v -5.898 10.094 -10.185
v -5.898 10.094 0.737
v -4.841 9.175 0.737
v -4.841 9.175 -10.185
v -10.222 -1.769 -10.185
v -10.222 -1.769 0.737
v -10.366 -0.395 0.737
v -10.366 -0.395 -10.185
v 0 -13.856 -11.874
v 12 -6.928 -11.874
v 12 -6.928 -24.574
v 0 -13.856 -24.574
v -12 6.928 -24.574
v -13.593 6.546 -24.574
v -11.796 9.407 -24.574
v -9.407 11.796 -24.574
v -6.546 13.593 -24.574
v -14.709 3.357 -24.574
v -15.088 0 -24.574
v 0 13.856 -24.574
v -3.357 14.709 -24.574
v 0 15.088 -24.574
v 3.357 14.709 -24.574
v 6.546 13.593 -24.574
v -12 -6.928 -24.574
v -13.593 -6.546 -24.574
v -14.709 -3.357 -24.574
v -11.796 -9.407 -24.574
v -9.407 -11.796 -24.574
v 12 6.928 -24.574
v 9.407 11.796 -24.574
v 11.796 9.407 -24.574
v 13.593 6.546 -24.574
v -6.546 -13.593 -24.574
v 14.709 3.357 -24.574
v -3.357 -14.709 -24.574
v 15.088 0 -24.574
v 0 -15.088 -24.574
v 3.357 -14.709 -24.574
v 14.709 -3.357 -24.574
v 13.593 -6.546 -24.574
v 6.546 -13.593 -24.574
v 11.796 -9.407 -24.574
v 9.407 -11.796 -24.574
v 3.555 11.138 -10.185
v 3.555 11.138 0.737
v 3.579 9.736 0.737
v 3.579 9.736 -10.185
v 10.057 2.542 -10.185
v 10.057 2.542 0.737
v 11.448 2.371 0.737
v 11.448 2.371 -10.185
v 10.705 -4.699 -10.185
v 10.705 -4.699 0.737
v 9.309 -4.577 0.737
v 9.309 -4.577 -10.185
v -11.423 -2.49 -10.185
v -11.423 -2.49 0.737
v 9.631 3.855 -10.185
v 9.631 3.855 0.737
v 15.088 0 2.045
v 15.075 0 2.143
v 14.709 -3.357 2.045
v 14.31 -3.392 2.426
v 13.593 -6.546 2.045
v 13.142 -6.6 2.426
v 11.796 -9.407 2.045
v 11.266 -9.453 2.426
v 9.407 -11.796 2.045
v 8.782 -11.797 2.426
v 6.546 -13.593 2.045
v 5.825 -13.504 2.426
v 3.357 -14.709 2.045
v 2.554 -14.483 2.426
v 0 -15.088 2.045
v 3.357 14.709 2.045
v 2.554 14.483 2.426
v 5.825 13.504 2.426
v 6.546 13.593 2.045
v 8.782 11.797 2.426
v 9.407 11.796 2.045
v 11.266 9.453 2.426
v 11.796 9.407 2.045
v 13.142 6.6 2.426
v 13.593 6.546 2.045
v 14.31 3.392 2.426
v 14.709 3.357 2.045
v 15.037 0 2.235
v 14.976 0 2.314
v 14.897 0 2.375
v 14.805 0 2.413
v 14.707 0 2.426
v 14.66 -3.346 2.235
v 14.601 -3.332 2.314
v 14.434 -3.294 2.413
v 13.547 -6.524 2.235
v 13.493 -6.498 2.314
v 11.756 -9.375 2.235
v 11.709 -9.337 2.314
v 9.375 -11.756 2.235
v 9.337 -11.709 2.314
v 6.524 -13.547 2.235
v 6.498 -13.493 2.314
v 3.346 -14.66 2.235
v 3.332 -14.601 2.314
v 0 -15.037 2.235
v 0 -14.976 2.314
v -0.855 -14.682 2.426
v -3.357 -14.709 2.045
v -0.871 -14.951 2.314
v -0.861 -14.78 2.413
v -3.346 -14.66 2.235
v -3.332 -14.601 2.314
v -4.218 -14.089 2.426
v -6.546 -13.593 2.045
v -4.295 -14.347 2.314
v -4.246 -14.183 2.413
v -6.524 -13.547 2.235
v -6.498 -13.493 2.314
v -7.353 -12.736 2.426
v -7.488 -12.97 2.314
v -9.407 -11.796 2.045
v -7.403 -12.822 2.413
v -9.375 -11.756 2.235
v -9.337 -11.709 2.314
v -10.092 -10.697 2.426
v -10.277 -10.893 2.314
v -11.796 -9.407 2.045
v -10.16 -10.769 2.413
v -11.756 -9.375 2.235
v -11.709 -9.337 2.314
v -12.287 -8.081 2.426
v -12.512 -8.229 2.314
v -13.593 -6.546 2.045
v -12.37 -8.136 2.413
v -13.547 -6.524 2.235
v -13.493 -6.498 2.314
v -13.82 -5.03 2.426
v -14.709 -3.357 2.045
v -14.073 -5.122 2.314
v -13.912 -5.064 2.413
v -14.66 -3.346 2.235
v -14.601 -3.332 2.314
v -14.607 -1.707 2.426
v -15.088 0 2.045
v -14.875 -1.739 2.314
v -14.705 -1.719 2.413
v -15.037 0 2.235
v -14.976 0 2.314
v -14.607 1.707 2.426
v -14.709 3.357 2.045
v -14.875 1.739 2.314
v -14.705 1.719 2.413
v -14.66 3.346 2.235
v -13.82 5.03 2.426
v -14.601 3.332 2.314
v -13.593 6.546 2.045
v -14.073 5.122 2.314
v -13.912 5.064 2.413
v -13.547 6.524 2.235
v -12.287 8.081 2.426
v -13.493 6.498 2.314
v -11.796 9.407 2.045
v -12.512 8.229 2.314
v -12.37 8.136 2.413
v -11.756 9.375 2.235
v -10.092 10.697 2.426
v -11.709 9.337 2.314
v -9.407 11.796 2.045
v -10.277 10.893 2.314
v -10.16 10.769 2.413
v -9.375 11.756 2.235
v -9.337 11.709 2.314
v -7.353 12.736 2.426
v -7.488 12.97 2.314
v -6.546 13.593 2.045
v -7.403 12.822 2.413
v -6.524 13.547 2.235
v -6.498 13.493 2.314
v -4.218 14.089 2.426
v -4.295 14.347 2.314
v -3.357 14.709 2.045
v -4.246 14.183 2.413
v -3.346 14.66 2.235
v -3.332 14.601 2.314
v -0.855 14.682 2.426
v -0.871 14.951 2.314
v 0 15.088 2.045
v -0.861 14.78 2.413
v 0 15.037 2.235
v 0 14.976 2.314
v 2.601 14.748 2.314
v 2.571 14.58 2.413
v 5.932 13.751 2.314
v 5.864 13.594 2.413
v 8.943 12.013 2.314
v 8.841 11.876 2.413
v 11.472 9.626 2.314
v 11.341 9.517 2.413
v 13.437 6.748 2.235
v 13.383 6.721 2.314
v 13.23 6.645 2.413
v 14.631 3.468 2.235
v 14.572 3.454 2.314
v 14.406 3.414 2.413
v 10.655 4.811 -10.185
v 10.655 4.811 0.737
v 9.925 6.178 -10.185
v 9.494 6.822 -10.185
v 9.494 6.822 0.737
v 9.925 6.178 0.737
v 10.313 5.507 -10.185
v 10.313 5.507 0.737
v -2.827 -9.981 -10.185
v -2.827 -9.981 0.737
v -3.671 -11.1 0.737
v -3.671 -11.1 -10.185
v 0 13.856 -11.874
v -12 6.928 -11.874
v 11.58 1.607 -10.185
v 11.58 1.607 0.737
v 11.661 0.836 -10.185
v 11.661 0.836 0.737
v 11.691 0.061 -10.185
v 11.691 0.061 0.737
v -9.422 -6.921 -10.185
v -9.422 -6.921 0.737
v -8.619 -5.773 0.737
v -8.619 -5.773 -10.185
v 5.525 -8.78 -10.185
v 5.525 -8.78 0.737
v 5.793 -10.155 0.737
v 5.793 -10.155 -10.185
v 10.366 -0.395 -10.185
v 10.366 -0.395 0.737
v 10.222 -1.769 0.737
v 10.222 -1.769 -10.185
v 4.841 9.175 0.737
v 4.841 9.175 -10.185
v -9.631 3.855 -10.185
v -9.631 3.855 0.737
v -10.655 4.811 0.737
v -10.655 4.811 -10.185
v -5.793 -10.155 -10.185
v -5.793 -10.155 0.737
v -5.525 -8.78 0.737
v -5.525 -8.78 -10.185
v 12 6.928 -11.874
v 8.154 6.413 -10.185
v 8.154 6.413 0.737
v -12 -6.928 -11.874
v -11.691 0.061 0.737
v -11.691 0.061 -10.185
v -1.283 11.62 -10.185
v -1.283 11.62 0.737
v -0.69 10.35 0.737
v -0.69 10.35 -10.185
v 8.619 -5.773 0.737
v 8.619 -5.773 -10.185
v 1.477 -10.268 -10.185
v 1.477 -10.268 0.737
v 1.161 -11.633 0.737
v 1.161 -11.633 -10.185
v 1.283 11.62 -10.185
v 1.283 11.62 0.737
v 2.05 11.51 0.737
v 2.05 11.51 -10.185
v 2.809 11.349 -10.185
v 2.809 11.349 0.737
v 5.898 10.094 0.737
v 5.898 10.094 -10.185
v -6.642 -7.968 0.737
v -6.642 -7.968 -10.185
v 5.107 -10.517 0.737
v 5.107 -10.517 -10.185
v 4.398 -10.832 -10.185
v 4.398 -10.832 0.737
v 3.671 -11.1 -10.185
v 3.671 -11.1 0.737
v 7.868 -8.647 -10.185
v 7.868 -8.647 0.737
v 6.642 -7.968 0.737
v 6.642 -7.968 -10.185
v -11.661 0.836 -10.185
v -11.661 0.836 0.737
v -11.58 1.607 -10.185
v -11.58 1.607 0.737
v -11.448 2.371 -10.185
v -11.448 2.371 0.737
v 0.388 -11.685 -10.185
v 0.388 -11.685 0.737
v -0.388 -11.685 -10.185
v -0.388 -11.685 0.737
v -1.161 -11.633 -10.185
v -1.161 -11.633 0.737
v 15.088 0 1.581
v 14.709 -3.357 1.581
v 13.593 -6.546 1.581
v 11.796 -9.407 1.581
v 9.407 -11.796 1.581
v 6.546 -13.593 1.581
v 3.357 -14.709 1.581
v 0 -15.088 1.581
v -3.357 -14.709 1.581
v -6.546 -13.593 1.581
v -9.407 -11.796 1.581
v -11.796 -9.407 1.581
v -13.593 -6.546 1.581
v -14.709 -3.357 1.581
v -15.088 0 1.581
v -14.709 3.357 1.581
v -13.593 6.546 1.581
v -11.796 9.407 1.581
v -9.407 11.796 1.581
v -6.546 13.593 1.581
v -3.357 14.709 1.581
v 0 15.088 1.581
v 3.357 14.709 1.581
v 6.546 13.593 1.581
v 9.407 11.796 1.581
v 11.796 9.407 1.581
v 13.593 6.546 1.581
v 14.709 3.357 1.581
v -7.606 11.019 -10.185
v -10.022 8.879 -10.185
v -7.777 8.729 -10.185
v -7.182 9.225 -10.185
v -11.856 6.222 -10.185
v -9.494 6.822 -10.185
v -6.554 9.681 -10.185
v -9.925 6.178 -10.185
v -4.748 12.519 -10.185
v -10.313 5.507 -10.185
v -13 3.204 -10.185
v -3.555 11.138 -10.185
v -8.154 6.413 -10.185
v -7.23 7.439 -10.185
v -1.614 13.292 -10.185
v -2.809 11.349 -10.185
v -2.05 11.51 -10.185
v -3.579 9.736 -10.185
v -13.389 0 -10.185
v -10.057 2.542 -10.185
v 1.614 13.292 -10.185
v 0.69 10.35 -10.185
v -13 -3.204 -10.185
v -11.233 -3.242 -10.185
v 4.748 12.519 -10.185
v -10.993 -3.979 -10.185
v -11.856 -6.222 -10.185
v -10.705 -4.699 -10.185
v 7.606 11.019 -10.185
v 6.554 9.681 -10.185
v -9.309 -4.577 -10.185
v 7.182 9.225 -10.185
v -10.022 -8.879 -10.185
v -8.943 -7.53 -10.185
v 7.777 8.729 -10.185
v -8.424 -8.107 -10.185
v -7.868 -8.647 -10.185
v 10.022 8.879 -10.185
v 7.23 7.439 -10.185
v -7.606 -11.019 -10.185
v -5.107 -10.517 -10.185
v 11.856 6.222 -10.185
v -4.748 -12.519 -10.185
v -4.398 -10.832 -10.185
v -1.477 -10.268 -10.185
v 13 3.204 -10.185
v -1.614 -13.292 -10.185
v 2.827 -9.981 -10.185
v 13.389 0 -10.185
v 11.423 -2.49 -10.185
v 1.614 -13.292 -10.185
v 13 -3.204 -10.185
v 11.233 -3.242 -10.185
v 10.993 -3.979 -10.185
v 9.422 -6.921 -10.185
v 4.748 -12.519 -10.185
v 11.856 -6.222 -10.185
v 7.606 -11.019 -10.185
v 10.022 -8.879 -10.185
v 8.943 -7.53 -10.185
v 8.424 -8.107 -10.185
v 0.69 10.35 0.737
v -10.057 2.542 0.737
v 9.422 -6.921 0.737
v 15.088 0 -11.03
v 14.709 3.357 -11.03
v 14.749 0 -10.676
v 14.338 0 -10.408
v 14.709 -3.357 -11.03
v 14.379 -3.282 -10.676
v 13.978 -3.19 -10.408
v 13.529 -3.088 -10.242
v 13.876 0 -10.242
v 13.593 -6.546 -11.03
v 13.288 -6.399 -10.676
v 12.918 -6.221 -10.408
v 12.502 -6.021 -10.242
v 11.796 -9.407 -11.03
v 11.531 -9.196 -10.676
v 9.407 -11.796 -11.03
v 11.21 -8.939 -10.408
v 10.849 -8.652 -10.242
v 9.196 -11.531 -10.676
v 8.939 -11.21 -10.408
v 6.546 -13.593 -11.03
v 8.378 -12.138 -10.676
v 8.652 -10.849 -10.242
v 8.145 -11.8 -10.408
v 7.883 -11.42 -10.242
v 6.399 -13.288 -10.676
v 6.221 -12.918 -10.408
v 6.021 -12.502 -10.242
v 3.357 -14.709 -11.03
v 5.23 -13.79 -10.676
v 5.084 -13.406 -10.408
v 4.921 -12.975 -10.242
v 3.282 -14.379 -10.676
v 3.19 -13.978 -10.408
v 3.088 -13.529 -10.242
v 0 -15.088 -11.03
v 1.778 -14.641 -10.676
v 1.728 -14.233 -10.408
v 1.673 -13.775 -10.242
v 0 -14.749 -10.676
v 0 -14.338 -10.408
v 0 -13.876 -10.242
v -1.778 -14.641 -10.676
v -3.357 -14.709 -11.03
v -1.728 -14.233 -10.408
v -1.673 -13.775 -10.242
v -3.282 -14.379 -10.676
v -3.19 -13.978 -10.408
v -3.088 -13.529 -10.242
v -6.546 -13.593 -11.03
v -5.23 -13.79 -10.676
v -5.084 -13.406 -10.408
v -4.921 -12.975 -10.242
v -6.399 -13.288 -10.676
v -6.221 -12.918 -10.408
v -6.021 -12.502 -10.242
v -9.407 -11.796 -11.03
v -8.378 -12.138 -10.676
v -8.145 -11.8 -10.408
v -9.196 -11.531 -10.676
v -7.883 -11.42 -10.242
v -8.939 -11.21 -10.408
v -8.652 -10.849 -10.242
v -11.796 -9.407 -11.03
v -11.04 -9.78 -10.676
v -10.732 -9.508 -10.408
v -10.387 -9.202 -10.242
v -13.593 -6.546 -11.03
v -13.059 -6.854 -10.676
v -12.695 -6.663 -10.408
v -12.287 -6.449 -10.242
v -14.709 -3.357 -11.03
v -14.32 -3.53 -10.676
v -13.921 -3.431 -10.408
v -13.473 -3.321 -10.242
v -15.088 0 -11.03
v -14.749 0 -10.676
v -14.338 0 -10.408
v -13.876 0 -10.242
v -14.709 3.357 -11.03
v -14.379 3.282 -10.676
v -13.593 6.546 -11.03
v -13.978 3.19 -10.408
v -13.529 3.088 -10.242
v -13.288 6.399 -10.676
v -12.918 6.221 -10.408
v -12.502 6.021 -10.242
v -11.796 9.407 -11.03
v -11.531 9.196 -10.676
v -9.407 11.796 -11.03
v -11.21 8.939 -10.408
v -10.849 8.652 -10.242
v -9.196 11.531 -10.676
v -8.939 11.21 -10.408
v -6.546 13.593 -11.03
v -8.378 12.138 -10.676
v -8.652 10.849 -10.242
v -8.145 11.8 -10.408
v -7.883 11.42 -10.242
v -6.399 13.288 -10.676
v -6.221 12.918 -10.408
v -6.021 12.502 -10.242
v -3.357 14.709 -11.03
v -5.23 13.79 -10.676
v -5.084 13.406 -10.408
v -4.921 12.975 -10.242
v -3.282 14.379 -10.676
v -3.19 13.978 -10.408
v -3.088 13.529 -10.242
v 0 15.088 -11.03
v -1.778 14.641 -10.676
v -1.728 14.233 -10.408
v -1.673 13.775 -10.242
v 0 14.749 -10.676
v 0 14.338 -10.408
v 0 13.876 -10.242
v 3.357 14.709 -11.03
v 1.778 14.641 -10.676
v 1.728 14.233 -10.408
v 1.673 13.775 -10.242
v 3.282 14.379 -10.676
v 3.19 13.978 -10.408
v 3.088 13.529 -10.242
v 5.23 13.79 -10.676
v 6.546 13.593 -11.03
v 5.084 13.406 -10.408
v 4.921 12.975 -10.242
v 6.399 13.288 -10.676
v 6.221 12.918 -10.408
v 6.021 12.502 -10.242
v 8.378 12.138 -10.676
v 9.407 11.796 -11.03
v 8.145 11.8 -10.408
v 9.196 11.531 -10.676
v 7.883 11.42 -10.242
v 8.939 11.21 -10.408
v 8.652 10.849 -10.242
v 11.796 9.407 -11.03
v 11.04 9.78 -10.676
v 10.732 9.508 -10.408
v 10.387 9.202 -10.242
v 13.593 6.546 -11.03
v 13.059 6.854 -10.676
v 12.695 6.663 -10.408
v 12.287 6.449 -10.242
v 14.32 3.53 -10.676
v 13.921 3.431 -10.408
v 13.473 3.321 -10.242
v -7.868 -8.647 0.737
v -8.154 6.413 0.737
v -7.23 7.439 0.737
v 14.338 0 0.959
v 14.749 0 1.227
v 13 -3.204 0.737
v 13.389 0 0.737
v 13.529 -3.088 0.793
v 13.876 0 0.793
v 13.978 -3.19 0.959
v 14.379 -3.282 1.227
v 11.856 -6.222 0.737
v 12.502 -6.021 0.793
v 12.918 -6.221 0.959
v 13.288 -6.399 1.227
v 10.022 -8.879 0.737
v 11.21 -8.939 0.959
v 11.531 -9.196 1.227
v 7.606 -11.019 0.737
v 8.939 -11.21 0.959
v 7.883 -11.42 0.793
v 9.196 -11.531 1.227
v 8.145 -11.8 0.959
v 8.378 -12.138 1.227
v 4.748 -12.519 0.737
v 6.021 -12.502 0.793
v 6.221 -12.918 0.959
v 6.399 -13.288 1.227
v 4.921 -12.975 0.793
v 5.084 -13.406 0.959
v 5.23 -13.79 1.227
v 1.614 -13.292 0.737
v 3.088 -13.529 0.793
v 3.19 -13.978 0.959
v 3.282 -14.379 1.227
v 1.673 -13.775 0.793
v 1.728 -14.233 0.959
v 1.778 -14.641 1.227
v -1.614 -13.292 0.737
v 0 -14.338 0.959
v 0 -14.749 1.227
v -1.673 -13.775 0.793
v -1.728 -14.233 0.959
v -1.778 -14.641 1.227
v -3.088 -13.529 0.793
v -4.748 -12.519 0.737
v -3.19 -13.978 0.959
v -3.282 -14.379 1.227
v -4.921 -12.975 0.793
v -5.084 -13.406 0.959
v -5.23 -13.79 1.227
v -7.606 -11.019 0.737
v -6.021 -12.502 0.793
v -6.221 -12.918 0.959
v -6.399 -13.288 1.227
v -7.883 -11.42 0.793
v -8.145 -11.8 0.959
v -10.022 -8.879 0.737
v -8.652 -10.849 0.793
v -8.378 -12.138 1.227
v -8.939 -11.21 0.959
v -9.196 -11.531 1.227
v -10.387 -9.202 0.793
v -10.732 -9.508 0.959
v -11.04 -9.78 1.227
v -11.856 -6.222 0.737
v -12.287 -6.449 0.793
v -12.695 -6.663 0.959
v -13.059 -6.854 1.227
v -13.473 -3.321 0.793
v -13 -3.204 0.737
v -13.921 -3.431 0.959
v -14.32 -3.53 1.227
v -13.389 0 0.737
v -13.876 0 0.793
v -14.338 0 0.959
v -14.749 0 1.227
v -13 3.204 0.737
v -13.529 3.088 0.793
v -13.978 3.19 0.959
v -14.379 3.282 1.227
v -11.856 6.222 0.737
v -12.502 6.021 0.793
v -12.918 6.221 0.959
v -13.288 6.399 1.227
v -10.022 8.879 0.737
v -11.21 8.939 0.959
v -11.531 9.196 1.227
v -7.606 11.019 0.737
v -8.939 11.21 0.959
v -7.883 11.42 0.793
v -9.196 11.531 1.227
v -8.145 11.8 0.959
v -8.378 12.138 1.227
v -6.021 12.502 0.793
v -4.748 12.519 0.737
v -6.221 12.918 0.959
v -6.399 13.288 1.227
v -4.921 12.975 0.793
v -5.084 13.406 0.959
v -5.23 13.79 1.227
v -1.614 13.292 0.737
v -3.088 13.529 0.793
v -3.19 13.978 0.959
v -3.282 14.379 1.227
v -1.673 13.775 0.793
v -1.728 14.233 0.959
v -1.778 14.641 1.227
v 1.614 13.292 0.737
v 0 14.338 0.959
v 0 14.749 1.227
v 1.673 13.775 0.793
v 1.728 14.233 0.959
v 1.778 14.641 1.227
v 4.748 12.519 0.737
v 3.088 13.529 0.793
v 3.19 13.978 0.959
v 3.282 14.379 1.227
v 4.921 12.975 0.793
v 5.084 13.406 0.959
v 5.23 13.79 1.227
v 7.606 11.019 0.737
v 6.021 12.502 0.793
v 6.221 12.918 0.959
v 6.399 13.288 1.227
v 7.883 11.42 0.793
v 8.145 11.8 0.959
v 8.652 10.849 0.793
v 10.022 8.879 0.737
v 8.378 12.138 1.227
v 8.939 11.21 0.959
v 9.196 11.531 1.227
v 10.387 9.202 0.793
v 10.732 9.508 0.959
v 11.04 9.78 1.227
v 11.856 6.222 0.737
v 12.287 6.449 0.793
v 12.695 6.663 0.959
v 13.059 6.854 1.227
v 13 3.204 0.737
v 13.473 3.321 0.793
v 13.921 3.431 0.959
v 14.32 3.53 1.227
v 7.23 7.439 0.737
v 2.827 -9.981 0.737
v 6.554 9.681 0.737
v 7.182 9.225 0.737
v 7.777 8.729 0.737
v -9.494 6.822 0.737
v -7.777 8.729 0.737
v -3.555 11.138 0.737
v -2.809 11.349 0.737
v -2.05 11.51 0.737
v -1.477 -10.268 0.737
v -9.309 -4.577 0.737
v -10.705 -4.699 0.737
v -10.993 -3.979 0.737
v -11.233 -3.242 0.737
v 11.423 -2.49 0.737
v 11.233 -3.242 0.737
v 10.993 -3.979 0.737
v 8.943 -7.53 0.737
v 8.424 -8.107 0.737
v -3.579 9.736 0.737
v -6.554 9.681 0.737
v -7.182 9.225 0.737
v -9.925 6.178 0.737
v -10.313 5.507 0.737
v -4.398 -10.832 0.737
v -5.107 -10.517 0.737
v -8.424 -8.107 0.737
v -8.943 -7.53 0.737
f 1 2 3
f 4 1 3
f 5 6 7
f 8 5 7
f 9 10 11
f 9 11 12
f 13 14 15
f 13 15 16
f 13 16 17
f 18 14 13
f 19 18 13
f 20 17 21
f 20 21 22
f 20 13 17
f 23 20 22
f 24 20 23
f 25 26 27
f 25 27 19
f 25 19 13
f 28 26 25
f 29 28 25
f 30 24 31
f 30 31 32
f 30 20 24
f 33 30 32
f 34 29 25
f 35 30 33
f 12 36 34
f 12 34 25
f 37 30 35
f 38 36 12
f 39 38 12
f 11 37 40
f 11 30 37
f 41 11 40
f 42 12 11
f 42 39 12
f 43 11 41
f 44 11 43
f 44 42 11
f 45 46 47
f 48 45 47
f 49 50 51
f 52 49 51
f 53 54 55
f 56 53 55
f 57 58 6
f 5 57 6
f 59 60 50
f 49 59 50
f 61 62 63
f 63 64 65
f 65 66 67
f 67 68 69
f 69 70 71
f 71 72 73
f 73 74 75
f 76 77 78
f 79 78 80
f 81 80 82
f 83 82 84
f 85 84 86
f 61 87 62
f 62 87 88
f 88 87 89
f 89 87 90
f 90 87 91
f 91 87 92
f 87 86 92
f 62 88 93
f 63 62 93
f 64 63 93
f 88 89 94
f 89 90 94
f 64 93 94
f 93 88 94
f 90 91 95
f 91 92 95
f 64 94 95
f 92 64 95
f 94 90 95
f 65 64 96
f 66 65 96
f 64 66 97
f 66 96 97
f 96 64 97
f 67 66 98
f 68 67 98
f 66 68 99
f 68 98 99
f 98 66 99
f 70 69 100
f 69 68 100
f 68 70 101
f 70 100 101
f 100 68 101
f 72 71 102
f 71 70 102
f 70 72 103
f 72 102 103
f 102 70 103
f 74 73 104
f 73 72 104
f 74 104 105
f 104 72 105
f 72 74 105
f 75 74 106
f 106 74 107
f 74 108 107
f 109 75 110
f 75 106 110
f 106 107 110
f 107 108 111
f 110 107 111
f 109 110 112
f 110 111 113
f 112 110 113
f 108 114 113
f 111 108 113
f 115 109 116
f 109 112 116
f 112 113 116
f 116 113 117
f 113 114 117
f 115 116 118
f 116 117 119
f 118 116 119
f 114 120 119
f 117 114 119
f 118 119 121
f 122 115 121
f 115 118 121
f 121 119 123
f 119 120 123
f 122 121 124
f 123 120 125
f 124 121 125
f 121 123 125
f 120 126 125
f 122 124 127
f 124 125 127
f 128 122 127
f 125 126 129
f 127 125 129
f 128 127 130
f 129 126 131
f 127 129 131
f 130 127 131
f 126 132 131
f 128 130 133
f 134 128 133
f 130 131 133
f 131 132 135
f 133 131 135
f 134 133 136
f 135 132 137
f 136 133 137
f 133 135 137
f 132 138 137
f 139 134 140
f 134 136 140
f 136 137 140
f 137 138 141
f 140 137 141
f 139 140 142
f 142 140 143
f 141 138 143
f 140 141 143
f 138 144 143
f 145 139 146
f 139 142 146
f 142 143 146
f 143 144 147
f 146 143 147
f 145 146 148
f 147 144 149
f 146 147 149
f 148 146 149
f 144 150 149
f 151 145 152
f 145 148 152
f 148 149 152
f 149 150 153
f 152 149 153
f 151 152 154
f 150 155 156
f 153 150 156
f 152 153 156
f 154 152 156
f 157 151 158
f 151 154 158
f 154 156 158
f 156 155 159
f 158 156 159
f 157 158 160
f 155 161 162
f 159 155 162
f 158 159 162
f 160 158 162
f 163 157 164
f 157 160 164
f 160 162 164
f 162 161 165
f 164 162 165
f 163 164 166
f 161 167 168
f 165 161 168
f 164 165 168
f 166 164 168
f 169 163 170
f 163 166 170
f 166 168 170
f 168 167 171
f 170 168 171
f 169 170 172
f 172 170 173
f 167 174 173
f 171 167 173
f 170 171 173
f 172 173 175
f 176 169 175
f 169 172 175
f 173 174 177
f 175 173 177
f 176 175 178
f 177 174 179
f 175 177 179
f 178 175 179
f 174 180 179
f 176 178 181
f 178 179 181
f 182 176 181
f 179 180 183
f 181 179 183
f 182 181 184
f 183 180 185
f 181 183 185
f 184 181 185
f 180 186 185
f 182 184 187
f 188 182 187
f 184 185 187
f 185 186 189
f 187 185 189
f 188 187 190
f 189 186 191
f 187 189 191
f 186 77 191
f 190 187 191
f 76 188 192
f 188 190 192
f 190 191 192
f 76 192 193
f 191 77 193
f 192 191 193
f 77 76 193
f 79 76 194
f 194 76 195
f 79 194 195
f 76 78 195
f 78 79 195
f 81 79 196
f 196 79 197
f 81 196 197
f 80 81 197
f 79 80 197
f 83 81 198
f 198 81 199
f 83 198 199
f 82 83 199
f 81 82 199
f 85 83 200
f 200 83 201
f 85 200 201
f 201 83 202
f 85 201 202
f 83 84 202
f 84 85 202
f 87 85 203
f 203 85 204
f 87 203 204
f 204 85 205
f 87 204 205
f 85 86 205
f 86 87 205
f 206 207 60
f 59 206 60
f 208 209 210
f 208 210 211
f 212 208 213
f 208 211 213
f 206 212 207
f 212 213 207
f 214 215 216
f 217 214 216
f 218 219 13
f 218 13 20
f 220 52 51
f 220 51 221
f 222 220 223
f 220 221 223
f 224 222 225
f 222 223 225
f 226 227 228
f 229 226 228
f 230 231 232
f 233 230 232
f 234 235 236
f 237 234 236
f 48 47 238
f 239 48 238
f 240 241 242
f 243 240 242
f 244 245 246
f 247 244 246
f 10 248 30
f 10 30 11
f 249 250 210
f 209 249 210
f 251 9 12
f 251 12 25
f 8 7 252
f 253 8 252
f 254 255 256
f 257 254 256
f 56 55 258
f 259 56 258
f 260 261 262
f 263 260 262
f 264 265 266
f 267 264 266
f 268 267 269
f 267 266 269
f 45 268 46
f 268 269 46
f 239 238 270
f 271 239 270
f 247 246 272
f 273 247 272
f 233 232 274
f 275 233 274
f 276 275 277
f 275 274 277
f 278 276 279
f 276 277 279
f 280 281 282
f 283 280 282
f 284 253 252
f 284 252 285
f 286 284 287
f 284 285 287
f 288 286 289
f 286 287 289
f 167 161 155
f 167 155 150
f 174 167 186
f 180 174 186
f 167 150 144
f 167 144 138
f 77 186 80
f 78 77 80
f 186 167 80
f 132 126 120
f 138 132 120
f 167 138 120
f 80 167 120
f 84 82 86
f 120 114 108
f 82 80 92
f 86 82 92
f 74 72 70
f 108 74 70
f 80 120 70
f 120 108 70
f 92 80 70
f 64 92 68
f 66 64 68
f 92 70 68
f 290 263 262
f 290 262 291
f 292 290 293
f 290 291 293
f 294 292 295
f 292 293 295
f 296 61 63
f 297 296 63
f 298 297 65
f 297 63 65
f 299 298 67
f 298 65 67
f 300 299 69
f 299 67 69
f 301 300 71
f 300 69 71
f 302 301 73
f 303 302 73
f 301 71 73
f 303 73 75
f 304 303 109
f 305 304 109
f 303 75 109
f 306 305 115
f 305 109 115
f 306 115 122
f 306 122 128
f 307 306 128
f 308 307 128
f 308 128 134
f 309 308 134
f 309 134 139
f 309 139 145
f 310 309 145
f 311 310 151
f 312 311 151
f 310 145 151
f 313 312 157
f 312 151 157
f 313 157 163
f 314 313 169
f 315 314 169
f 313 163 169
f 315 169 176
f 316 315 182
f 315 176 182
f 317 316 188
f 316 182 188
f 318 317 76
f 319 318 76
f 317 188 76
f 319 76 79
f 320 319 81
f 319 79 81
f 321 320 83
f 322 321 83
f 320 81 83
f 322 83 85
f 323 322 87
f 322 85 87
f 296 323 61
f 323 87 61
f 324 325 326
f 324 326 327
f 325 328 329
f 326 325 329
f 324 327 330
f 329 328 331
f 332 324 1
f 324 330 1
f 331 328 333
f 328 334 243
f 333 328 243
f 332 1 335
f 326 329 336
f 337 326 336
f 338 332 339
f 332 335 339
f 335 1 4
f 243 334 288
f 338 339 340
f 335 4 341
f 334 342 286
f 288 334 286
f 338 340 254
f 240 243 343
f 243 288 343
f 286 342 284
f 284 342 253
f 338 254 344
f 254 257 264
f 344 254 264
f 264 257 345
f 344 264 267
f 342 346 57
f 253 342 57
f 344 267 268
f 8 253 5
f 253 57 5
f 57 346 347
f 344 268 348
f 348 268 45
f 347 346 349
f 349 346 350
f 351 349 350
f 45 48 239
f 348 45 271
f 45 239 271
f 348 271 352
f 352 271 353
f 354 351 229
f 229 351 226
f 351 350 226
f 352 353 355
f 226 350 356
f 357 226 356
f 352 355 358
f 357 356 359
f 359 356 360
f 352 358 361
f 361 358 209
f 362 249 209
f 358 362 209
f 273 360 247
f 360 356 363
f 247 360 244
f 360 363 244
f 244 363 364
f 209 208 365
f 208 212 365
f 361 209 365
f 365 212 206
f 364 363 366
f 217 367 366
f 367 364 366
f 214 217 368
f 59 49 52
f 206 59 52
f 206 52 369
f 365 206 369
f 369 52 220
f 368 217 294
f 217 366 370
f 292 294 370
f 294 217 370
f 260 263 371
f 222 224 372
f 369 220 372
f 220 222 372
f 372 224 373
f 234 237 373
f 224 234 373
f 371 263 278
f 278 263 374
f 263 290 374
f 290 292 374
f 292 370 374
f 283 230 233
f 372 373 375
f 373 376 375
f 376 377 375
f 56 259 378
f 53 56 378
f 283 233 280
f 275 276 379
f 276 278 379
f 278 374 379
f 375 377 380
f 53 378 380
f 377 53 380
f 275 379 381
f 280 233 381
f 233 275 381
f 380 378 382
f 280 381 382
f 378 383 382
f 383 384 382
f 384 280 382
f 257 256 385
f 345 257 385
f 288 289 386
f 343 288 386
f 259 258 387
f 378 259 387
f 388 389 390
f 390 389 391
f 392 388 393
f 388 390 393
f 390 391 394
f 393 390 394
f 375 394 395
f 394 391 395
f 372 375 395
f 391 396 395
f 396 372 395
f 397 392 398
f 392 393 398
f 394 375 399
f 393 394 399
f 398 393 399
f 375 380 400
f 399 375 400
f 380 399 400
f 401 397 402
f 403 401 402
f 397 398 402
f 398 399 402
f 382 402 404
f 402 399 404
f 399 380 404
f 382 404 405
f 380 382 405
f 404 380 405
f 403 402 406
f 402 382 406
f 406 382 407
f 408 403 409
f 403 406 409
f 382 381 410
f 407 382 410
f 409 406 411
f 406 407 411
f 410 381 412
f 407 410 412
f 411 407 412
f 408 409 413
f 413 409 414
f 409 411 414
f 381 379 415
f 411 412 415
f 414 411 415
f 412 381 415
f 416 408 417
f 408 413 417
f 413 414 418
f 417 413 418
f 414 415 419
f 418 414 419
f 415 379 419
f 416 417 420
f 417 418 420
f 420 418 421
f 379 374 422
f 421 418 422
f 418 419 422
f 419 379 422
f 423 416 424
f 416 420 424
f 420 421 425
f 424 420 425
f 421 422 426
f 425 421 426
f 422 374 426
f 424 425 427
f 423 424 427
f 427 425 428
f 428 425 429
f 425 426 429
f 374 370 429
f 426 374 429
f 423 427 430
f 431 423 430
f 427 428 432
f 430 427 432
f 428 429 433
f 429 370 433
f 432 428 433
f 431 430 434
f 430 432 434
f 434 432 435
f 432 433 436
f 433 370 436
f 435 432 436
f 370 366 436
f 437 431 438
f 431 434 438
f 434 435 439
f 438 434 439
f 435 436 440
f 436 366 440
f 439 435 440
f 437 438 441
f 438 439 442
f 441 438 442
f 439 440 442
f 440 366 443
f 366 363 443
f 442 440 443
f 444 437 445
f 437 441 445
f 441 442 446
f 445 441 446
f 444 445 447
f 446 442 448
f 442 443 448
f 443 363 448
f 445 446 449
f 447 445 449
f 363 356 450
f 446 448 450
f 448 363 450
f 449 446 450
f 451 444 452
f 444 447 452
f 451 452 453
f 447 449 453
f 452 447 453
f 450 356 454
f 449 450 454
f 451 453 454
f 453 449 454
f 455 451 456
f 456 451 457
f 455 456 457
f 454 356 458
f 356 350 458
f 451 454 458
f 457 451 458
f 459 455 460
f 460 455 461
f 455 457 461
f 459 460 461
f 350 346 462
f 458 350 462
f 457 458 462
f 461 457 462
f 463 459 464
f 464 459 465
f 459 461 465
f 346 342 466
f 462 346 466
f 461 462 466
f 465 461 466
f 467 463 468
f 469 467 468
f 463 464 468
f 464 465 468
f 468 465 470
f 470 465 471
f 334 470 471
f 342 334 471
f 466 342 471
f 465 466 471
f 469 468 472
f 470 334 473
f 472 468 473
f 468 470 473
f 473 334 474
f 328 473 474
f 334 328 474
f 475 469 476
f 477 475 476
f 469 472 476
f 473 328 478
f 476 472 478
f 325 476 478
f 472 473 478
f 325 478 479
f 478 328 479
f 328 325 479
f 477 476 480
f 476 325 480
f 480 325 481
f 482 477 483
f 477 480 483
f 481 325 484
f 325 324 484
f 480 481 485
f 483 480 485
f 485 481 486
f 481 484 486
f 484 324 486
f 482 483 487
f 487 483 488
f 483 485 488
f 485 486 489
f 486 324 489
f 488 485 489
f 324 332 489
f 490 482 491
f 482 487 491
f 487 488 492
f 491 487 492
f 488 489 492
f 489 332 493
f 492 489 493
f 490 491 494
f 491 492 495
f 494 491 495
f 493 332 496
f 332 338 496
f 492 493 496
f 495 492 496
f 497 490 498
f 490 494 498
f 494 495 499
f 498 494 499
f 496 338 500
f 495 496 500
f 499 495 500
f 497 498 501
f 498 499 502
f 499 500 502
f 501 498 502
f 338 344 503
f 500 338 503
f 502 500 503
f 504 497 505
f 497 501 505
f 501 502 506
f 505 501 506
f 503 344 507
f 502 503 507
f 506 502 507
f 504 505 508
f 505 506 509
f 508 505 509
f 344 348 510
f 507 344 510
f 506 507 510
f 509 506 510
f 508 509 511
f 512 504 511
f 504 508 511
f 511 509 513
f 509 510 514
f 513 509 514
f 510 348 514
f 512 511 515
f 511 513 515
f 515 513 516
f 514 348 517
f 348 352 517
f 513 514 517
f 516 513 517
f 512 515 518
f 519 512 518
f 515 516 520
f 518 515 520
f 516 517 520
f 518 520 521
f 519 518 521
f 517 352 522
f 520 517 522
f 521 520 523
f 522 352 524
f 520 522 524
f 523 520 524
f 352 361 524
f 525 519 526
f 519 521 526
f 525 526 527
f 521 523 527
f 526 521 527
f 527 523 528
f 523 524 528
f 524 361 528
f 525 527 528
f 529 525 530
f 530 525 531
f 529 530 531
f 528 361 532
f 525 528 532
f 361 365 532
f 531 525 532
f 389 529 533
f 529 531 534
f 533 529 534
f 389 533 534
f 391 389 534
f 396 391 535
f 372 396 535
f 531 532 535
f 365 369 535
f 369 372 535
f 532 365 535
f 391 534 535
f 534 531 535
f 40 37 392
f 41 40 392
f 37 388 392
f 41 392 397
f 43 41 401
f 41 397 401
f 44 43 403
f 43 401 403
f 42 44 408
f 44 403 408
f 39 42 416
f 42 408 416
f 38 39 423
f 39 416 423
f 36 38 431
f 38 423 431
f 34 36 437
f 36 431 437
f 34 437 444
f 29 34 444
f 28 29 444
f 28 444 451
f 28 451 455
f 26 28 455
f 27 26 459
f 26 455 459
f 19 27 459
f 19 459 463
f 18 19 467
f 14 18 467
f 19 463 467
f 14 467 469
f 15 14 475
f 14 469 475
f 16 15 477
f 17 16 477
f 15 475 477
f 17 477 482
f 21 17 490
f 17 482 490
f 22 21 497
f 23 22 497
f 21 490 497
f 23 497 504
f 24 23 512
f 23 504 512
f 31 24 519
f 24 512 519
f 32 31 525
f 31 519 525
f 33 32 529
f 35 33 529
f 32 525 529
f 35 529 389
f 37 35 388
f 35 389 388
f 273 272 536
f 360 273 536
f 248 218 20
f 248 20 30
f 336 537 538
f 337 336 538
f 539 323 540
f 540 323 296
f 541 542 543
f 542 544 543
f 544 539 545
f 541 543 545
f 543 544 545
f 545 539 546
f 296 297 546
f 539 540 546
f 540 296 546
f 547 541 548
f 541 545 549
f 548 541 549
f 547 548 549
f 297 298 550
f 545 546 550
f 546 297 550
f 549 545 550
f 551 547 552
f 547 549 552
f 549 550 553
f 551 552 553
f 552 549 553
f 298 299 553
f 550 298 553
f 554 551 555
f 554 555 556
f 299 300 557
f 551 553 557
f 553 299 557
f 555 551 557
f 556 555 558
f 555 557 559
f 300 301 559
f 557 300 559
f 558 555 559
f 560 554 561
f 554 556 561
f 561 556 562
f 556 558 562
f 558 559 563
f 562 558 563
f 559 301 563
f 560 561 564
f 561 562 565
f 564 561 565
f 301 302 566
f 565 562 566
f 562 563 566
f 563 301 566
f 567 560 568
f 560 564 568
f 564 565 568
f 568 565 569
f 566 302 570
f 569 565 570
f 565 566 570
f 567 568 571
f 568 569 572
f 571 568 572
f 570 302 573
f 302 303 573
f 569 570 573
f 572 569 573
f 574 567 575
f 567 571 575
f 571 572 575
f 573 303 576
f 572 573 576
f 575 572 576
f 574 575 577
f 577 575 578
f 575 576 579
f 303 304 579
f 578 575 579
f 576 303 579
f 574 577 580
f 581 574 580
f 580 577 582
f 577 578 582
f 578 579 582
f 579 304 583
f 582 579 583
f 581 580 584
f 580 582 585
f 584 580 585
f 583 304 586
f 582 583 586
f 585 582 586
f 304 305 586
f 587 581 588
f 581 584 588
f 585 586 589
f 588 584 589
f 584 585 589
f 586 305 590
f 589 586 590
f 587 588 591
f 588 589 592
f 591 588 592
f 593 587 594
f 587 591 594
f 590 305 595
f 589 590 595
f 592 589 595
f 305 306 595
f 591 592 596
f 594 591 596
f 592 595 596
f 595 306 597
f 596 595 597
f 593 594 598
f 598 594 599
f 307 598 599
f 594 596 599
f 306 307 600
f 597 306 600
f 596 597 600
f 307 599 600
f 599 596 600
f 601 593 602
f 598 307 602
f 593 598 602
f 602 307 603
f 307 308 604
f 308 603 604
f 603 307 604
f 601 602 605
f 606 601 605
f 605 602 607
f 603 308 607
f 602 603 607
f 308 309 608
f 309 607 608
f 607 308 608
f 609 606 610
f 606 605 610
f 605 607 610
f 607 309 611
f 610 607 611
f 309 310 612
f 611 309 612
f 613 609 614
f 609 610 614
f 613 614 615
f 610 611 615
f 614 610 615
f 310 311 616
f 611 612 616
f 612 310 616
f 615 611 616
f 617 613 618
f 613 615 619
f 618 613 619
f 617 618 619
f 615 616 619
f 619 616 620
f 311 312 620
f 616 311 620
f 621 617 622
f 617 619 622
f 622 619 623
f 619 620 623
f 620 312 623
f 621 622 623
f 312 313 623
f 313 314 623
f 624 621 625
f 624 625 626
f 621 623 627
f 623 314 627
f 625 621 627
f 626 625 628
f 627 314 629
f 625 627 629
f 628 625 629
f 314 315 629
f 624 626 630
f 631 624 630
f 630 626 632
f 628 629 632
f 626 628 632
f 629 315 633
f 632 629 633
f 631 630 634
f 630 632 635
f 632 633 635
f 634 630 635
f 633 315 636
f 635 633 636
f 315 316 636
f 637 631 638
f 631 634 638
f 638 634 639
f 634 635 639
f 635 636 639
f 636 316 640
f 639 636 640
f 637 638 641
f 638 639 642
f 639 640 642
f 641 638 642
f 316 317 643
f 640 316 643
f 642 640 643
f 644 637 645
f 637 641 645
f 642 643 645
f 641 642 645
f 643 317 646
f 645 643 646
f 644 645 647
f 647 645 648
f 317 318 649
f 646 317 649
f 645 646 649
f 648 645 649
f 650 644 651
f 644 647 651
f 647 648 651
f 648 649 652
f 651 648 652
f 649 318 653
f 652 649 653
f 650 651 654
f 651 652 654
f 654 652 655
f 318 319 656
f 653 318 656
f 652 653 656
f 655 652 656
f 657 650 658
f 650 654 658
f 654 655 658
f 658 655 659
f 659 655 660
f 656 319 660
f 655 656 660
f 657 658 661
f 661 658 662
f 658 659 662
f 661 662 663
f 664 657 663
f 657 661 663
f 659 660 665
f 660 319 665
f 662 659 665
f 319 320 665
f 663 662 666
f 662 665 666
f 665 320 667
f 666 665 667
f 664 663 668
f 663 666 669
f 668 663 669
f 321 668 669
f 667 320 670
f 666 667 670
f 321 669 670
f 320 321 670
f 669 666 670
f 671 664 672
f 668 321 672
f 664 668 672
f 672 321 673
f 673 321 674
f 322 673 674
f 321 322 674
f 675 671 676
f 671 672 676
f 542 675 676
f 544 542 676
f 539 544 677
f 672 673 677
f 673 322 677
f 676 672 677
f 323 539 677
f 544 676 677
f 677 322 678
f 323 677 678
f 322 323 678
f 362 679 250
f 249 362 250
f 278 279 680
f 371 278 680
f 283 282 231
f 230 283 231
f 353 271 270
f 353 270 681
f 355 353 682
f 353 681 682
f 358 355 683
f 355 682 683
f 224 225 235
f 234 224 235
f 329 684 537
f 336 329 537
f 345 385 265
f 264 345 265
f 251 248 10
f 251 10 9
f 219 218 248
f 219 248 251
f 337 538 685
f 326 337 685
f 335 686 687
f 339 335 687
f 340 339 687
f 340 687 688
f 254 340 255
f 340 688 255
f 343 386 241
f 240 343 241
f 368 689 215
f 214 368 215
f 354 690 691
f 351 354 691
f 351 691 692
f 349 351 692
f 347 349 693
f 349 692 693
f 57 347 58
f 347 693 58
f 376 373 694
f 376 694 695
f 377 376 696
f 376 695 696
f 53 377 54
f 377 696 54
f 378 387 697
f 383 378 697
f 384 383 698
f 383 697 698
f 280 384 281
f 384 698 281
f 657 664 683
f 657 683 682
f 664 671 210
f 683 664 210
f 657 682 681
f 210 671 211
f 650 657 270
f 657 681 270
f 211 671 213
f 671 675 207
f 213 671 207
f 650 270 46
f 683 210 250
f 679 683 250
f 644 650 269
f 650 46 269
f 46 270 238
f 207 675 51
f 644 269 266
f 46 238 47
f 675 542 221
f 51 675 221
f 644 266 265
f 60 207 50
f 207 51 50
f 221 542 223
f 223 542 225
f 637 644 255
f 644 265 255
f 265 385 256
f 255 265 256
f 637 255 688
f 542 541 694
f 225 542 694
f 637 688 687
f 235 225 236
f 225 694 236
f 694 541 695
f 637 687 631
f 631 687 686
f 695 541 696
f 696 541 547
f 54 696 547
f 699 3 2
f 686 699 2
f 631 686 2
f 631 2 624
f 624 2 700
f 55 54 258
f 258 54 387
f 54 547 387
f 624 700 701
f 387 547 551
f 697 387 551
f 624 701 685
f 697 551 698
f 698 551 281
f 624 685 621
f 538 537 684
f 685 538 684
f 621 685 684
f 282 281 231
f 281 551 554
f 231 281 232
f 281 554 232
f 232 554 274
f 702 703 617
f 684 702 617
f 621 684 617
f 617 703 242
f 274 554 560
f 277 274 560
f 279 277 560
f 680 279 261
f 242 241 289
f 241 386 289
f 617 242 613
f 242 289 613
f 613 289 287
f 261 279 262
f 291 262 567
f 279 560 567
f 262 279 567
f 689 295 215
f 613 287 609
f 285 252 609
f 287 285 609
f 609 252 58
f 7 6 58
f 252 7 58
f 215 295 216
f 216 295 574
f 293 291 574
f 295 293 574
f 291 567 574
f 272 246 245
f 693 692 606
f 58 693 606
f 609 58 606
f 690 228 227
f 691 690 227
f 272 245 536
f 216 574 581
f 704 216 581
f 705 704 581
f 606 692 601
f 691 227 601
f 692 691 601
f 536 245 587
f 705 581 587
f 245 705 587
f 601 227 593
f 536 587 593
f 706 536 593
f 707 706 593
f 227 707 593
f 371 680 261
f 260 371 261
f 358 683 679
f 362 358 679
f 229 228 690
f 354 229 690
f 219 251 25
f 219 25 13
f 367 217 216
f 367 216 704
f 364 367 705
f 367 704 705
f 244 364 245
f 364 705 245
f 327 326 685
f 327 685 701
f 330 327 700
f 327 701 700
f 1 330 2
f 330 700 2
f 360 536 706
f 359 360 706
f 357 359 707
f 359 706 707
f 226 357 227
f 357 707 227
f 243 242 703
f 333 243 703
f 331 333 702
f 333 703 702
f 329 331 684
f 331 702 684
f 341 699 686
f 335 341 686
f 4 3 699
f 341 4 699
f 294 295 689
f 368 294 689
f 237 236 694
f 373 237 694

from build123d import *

# Parameters (mm, degrees)
CUT_EXTRUDE1_START  = 0.7366
CUT_EXTRUDE1_DEPTH  = 10.922
CIRPATTERN1_COUNT   = 15
FILLET1_R           = 0.381
SKETCH7_R           = 15.0876
BOSS_EXTRUDE1_DEPTH = 12.7
CUT_EXTRUDE3_DEPTH  = 12.7


# Read off the part's stored shape, not the designer's step: Split1
with BuildPart() as part:
    # Sketch2 → Revolve1 (revolve)
    with BuildSketch(Plane(origin=(0, 0, 0), x_dir=(0, 0, -1), z_dir=(1, 0, 0)), mode=Mode.PRIVATE) as revolve1_sk:
        with BuildLine():
            Line((-11.8745, 0), (11.8745, 0))
            Line((11.8745, 0), (11.8745, 15.0876))
            Line((11.8745, 15.0876), (11.02995, 15.0876))
            ThreePointArc((11.02995, 15.0876), (10.408190439, 14.337674152), (10.1854, 13.389339743))
            Line((10.1854, 13.389339743), (10.1854, 11.691079486))
            Line((10.1854, 11.691079486), (-0.7366, 11.691079486))
            Line((-0.7366, 11.691079486), (-0.7366, 13.389339743))
            ThreePointArc((-0.7366, 13.389339743), (-0.959390439, 14.337674152), (-1.58115, 15.0876))
            Line((-1.58115, 15.0876), (-2.4257, 15.0876))
            Line((-2.4257, 15.0876), (-2.4257, 7.9375))
            Line((-2.4257, 7.9375), (-11.8745, 7.9375))
            Line((-11.8745, 7.9375), (-11.8745, 0))
        make_face()
    revolve(revolve1_sk.sketch.rotate(Axis((0, 0, 11.8745), (0, 0, -1)), 90), axis=Axis((0, 0, 11.8745), (0, 0, -1)))

    # Sketch3 → Cut-Extrude1 (cut)
    with BuildSketch(Plane.XY.offset(CUT_EXTRUDE1_START)):
        with BuildLine():
            Line((-0.690489274, 10.3505), (0.690489274, 10.3505))
            Line((0.690489274, 10.3505), (1.2827, 11.6205))
            ThreePointArc((1.2827, 11.6205), (0, 11.691079486), (-1.2827, 11.6205))
            Line((-1.2827, 11.6205), (-0.690489274, 10.3505))
        make_face()
    cut_extrude1 = extrude(amount=-CUT_EXTRUDE1_DEPTH, mode=Mode.SUBTRACT)

    # CirPattern1: Cut-Extrude1 ×15 about axis
    cirpattern1_axis = Axis((0, 0, 0), (0, 0, 1))
    for i in range(1, CIRPATTERN1_COUNT):
        add(cut_extrude1.rotate(cirpattern1_axis, i * 360 / CIRPATTERN1_COUNT), mode=Mode.SUBTRACT)


with BuildPart() as body_2:
    # Split1: the piece on the far side of the plane
    add(part.part)
    split(bisect_by=Plane.XY.offset(2.4257), keep=Keep.BOTTOM)

    # Fillet1
    fillet1_edges = [body_2.edges().sort_by_distance(p)[0] for p in [
        (-15.0876, 0, 2.4257),
    ]]
    fillet(fillet1_edges, radius=FILLET1_R)

    # Sketch7 → Boss-Extrude1 (add)
    with BuildSketch(Plane(origin=(0, 0, -11.8745), x_dir=(-1, 0, 0), z_dir=(0, 0, -1))):
        with Locations(Location((0, 0, 0), (0, 0, 180))):
            Circle(SKETCH7_R)
    extrude(amount=BOSS_EXTRUDE1_DEPTH)

    # Sketch6 → Cut-Extrude3 (cut)
    with BuildSketch(Plane(origin=(0, 0, -11.8745), x_dir=(-1, 0, 0), z_dir=(0, 0, -1))):
        Polygon((-12, 6.92820323), (-12, -6.92820323), (0, -13.856406461), (12, -6.92820323), (12, 6.92820323), (0, 13.856406461), align=None)
    extrude(amount=CUT_EXTRUDE3_DEPTH, mode=Mode.SUBTRACT)


with BuildPart() as part_1:
    add(part.part)

    # Split1
    split(bisect_by=Plane.XY.offset(2.4257), keep=Keep.TOP)


solid = body_2.part
